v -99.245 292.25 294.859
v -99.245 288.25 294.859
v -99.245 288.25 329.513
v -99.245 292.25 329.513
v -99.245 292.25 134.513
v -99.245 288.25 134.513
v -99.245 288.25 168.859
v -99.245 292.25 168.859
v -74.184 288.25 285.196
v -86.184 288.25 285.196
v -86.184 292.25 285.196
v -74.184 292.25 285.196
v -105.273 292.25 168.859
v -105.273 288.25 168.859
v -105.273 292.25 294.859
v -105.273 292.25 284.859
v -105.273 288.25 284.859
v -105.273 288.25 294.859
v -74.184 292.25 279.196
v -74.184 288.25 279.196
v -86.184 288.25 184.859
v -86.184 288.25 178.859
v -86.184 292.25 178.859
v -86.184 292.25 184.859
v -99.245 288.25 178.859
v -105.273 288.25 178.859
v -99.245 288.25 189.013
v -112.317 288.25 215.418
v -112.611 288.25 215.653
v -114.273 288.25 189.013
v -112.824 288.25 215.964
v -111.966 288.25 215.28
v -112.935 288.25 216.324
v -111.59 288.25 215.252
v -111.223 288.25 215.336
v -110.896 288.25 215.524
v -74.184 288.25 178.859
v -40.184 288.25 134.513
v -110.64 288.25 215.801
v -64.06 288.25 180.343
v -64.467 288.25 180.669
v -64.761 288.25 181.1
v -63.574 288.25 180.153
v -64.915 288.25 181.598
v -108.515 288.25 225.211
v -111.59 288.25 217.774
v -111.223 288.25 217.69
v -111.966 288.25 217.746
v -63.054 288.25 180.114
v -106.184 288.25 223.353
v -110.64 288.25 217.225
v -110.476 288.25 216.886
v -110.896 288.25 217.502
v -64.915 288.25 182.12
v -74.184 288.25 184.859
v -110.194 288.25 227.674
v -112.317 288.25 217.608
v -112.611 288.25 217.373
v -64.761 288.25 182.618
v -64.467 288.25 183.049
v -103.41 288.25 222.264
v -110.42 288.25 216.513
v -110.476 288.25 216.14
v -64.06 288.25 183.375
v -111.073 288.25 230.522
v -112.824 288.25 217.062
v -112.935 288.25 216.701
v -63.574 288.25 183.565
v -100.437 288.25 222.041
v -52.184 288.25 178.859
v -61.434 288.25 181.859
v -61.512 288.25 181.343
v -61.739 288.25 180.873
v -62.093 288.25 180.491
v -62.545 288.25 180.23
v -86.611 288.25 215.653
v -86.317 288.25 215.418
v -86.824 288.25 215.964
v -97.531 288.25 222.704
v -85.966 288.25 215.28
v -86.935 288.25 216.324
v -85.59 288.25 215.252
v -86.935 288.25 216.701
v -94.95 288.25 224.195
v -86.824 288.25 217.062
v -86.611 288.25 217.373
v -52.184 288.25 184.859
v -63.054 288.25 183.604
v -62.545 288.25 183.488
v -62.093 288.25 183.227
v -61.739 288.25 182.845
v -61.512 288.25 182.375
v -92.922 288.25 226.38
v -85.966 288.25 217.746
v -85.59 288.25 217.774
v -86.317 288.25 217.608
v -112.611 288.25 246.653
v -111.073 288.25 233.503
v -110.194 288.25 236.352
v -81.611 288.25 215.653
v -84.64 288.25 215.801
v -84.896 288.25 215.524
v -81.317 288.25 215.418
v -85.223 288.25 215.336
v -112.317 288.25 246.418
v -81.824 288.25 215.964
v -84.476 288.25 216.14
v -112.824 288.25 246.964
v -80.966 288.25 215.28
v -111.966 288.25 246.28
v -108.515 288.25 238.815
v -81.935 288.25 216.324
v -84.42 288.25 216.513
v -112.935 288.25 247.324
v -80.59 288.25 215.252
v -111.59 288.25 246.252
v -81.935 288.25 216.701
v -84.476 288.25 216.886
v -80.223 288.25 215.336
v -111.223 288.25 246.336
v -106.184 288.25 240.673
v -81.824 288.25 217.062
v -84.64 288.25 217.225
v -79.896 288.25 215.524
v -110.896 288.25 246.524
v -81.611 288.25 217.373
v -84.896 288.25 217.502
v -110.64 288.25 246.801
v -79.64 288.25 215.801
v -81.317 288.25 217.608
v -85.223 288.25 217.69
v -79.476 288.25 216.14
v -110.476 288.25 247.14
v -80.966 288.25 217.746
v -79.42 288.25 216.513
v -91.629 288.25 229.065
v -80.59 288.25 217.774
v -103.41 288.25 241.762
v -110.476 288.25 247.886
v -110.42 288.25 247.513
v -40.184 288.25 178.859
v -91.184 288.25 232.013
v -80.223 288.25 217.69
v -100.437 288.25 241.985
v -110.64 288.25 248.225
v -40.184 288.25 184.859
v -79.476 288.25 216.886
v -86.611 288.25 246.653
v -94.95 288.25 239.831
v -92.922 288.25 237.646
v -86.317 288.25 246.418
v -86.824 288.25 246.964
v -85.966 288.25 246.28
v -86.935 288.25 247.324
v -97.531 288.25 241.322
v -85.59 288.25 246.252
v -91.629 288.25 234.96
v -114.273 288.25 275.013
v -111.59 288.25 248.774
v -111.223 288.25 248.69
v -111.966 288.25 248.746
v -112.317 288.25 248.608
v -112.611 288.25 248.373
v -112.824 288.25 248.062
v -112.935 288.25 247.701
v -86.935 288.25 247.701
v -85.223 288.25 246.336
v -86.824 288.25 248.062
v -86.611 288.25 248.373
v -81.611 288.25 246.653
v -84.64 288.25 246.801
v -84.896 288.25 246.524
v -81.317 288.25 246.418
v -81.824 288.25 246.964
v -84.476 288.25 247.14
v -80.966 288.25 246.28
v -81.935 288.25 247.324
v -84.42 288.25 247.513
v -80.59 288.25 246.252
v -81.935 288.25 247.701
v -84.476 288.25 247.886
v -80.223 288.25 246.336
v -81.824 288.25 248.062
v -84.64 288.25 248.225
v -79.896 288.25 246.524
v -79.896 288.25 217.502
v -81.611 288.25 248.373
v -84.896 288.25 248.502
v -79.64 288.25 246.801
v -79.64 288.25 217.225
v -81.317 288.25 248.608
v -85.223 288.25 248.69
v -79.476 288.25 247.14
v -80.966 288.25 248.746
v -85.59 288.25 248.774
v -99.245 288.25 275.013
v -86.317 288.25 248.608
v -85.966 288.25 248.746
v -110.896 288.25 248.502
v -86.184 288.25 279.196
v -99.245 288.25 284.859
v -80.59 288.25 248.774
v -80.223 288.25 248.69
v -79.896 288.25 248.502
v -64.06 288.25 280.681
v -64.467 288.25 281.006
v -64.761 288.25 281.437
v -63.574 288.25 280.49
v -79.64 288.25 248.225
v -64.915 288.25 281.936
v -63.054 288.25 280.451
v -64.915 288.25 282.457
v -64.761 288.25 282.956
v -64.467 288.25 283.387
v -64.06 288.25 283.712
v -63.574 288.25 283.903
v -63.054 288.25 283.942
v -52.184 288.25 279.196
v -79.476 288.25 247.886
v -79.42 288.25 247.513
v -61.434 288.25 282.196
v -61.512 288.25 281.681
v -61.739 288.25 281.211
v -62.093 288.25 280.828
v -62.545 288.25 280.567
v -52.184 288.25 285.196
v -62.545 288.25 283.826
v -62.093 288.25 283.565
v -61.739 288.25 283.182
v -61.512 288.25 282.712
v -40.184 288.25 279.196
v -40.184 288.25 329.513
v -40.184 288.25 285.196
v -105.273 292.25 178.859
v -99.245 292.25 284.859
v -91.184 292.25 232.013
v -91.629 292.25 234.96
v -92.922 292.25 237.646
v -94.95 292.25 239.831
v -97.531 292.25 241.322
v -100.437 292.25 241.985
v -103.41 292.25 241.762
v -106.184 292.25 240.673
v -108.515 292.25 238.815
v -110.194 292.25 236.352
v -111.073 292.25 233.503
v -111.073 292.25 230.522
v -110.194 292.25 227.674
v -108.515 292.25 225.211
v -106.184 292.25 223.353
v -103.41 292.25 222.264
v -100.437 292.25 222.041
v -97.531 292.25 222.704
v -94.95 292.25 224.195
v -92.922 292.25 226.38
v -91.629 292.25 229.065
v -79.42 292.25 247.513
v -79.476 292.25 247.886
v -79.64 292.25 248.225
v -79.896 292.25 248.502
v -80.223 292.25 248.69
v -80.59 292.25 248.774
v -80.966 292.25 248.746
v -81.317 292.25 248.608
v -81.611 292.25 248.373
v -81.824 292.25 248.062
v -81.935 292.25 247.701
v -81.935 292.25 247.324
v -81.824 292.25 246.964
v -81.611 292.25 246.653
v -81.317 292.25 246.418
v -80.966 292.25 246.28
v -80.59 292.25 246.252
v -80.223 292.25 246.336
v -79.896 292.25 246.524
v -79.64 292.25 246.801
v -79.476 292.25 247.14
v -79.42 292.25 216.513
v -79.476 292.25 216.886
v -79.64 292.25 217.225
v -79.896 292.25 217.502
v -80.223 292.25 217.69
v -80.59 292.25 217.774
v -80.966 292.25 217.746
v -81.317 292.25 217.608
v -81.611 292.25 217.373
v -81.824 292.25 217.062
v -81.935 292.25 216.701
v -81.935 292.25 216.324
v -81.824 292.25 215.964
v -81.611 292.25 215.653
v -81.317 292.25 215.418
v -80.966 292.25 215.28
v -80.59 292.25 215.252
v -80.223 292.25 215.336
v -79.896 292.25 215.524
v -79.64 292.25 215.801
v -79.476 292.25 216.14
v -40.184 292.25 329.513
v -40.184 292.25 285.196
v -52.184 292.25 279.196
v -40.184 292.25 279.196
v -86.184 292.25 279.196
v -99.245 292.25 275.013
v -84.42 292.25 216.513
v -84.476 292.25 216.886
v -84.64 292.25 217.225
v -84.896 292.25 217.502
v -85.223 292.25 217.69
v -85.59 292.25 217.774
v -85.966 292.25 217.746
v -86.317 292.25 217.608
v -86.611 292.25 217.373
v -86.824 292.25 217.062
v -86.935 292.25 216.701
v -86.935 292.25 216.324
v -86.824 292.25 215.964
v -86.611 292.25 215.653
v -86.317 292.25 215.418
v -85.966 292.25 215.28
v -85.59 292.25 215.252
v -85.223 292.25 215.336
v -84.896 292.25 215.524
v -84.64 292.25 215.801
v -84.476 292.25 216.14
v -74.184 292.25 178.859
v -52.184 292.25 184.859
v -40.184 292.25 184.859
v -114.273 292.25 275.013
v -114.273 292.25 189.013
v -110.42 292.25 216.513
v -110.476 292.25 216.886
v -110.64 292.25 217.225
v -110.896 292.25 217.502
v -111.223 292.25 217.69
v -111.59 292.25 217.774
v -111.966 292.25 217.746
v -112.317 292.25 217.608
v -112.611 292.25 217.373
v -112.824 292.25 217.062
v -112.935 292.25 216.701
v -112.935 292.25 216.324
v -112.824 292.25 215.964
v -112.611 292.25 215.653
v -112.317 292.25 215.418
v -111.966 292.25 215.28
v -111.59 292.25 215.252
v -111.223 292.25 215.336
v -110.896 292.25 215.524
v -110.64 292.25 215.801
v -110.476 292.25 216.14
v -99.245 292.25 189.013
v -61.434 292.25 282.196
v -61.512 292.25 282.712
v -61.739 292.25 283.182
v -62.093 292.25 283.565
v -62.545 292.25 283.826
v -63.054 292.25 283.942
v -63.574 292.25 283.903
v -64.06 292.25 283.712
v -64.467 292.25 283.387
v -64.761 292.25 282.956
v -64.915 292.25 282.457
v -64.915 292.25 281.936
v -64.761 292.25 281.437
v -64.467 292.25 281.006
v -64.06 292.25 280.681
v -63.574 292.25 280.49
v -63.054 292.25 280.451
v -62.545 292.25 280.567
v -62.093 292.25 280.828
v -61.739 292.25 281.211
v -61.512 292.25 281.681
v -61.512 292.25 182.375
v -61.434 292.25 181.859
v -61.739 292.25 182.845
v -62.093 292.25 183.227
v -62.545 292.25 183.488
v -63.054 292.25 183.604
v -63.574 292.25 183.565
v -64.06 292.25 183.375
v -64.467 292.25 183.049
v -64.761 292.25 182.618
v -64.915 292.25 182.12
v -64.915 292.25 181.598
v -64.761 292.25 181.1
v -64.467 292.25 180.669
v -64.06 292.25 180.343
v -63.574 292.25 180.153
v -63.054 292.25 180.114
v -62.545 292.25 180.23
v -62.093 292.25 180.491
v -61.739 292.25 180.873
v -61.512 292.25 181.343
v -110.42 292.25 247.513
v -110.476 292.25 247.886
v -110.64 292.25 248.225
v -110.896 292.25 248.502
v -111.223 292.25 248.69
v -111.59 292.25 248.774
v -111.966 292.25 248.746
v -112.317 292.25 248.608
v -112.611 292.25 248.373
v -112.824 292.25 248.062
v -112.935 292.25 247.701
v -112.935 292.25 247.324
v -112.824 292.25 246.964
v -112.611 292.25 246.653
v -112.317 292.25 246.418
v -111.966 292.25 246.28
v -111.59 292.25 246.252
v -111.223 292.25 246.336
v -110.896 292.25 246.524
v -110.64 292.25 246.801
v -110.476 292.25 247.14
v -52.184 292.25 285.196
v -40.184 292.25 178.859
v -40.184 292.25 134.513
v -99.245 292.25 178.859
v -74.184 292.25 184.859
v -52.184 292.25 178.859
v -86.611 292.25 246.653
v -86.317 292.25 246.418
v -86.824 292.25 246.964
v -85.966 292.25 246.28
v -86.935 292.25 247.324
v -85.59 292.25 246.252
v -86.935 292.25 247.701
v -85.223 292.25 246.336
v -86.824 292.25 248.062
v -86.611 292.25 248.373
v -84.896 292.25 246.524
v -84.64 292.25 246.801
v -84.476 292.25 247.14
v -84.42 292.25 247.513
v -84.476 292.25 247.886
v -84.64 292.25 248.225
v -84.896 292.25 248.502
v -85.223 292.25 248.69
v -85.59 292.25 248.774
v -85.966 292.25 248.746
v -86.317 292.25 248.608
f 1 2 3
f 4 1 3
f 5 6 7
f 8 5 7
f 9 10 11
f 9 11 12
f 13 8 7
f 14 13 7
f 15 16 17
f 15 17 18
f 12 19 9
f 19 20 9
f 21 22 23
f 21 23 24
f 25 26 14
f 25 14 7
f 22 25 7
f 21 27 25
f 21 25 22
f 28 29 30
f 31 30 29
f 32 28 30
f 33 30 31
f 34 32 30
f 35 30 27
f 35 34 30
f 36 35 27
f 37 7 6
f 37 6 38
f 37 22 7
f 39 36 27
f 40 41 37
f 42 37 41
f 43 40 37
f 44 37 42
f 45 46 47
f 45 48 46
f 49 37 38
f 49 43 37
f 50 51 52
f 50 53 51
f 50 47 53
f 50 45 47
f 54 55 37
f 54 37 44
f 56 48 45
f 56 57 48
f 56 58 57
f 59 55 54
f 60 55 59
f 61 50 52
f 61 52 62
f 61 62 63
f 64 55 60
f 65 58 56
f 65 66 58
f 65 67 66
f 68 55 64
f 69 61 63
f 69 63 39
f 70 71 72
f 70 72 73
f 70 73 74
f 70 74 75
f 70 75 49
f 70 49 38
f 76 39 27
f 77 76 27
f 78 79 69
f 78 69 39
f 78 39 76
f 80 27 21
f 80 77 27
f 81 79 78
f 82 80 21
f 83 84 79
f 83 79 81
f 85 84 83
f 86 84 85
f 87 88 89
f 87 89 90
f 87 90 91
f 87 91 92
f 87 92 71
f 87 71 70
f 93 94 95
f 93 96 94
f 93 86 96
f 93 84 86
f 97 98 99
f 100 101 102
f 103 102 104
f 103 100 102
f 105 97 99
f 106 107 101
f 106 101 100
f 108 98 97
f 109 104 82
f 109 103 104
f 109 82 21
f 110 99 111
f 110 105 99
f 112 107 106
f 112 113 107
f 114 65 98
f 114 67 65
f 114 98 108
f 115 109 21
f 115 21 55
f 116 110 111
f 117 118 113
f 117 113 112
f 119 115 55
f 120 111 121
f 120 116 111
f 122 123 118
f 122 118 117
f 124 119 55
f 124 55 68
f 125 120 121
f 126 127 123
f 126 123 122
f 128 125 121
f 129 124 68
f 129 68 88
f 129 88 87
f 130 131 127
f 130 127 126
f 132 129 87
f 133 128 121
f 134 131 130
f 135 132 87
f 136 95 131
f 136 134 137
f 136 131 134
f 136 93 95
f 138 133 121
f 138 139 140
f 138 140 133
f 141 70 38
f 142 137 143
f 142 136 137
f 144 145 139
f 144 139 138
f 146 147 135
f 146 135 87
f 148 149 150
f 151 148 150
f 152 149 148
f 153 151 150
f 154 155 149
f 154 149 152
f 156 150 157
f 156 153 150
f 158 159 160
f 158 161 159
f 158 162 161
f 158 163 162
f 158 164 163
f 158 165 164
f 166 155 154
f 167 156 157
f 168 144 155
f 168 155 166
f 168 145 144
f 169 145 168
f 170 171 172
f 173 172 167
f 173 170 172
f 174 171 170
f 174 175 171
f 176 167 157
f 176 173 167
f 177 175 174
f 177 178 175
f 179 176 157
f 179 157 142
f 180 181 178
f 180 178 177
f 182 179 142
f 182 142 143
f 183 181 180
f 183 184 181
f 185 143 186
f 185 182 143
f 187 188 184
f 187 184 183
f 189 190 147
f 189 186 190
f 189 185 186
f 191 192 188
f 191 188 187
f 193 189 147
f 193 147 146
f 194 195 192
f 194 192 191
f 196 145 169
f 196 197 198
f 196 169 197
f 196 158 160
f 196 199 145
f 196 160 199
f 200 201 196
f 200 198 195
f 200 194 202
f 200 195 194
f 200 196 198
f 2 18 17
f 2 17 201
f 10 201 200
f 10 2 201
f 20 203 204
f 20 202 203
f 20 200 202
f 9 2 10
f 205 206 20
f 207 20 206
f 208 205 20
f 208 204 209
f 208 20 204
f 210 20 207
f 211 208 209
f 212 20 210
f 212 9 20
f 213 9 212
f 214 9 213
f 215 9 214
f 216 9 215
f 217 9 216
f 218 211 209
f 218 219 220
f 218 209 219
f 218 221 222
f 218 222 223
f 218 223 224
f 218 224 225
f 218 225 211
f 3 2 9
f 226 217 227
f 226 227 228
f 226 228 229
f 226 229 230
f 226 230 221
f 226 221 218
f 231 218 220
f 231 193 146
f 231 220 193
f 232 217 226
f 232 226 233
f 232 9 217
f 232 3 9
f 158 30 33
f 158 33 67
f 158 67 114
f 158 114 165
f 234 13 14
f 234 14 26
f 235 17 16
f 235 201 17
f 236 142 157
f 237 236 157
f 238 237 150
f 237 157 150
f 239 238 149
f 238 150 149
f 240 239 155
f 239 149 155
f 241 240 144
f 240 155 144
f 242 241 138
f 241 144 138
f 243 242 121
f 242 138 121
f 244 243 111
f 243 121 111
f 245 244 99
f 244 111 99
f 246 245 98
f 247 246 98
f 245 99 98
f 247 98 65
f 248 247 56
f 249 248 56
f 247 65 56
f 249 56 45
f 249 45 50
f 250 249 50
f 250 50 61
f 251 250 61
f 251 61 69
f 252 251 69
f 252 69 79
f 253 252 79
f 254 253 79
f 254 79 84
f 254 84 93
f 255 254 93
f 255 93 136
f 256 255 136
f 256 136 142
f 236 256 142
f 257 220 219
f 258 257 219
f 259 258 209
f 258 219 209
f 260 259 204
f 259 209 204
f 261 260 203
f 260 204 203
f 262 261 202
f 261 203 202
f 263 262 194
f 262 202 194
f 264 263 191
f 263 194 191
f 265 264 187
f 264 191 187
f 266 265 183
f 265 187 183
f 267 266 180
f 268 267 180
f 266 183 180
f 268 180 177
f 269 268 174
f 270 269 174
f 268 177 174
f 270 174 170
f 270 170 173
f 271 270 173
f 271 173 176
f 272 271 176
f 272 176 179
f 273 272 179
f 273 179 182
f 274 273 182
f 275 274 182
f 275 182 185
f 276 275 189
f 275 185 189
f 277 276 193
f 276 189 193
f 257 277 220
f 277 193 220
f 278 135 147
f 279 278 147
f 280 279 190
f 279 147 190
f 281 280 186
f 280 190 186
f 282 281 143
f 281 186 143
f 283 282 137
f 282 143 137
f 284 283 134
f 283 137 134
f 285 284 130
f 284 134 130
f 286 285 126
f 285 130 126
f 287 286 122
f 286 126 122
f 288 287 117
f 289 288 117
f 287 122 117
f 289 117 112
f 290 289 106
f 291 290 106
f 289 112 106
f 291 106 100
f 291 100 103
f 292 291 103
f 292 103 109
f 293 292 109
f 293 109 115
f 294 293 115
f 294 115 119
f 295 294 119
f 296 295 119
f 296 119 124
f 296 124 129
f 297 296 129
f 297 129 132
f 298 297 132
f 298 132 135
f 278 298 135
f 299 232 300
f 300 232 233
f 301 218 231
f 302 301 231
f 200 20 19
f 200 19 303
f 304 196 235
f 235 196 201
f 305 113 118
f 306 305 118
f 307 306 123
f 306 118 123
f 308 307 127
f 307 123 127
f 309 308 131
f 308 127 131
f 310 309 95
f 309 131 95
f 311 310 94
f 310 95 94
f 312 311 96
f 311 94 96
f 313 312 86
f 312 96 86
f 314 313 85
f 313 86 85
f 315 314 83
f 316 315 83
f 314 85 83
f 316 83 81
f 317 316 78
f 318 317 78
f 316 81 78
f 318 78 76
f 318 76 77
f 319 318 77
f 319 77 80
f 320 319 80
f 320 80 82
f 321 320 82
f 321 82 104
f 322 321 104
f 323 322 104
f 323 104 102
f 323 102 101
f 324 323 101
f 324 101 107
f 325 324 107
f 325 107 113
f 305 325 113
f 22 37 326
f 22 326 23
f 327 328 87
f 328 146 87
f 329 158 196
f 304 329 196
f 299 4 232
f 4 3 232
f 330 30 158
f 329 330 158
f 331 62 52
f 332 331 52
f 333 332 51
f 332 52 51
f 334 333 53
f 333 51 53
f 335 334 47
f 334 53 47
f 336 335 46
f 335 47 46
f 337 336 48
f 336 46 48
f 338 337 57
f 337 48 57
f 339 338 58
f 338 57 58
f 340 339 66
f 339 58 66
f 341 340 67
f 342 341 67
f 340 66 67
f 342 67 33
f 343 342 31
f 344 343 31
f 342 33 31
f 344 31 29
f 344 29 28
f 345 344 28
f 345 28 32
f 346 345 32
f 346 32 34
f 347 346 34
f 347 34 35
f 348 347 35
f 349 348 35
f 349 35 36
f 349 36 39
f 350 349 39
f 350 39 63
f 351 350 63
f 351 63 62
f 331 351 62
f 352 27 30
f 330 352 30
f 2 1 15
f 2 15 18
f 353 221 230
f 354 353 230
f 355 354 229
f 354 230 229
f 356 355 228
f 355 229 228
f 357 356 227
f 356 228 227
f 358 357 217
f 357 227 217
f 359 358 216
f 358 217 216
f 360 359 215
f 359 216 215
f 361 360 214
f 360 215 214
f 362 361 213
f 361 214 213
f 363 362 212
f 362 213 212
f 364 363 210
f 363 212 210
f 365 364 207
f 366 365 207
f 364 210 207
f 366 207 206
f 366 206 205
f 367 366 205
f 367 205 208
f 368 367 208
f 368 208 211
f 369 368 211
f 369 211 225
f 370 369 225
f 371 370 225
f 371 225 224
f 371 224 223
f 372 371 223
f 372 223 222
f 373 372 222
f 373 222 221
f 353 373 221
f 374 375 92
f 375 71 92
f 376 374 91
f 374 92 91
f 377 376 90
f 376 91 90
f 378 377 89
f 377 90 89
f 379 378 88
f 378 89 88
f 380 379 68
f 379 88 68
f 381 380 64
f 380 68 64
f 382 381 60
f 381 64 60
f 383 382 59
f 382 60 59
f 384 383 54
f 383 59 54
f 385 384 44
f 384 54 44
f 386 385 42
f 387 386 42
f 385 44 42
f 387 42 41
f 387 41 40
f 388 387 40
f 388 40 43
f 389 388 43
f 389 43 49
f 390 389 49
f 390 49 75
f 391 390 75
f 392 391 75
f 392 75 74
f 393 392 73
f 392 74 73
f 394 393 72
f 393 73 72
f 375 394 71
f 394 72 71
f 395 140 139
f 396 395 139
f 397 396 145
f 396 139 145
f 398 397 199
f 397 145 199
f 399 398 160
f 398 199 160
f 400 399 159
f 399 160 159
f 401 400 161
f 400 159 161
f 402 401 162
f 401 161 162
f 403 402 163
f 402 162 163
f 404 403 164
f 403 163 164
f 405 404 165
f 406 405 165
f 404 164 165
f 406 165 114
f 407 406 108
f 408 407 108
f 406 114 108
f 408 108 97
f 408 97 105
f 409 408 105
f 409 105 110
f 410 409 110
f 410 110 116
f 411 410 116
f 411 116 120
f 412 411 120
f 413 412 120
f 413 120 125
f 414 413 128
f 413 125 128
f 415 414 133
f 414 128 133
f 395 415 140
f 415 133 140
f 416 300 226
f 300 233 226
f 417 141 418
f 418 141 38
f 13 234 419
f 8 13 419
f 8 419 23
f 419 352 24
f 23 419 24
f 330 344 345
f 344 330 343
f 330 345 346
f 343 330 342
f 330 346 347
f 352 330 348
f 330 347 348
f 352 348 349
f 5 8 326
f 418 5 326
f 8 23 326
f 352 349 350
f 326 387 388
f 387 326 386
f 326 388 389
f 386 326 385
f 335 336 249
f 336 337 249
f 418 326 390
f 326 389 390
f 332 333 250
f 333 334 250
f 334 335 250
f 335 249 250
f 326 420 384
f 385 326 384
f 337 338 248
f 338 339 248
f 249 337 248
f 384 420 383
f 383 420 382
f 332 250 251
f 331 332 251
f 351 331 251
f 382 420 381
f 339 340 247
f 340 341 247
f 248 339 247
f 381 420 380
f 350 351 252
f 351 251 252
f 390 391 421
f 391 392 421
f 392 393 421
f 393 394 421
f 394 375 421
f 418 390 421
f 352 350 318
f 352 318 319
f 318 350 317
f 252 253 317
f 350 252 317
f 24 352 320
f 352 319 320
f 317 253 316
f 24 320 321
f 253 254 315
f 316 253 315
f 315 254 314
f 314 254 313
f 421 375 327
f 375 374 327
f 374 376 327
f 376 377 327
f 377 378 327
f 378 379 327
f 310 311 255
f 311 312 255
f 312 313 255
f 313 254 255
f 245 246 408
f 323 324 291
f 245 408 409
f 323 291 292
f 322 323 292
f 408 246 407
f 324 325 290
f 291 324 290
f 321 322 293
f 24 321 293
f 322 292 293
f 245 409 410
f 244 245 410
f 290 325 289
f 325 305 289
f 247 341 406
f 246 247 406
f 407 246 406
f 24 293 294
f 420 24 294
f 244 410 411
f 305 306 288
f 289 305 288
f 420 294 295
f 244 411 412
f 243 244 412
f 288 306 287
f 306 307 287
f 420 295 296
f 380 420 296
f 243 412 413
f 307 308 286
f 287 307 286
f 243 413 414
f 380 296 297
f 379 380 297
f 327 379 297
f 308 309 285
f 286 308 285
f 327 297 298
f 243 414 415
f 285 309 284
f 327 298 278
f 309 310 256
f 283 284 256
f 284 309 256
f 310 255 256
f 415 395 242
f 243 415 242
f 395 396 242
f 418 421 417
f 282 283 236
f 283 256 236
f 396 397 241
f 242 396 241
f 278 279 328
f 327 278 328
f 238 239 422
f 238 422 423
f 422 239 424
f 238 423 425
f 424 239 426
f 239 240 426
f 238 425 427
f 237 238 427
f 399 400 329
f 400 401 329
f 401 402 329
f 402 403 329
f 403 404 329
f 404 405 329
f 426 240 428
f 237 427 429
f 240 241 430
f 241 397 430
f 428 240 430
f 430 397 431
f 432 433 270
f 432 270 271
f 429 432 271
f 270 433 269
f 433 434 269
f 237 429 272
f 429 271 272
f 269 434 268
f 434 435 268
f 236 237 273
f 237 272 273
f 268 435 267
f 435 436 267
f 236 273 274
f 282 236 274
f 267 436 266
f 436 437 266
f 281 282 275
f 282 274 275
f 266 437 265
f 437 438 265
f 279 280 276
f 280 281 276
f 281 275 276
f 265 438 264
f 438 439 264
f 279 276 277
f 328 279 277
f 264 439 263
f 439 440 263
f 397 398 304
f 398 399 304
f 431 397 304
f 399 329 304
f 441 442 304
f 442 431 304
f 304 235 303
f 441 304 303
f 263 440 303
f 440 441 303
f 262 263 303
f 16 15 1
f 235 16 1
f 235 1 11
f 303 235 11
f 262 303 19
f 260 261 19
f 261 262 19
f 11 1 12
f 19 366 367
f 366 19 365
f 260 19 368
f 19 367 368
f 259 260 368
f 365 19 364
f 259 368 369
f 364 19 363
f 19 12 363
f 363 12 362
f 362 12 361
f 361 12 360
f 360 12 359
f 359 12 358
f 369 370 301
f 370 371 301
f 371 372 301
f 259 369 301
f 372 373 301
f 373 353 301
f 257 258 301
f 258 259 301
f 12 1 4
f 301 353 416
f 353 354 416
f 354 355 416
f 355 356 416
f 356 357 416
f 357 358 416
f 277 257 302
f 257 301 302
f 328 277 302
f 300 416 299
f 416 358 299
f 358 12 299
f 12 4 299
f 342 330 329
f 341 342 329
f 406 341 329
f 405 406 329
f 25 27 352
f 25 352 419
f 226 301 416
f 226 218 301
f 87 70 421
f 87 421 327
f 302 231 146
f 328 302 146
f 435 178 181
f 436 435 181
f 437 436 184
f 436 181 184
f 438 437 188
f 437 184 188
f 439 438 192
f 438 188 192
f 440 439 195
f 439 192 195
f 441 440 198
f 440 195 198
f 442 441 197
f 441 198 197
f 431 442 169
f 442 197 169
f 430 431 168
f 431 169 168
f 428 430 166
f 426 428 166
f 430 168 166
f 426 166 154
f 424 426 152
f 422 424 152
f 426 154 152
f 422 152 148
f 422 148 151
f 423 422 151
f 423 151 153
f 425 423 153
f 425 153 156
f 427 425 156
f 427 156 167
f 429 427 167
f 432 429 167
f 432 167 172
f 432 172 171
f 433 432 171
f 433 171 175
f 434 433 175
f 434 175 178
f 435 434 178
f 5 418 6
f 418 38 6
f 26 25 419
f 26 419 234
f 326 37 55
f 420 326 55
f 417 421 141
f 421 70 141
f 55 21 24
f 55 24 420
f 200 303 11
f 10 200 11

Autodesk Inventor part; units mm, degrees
ref_plane "YZ Plane" through (0, 0, 0) normal (1, 0, 0) x (0, 1, 0)
ref_plane "XZ Plane" through (0, 0, 0) normal (0, 1, 0) x (-1, 0, 0)
ref_plane "РабПлоскость1" through (-53.4845, 288.2505, 354.5129) normal (0, 1, 0) x (-1, 0, 0)
sketch "Эскиз1" plane through (-53.4845, 288.2505, 354.5129) normal (0, 1, 0) x (-1, 0, 0)
  line L0 (45.7889, -56.5016) -> (45.7889, -62.7516) projected
  line L1 (-13.3, 2.5) -> (-13.3, -247.5) projected
  line L2 (-13.3, -220) -> (32.7, -220)
  line L3 (32.7, -220) -> (32.7, -25)
  line L4 (32.7, -25) -> (-13.3, -25)
  line L5 (-13.3, -25) -> (-13.3, -220)
  line L6 (-5.3, -220) -> (142.8907, -220) projected
  line L7 (201.7, -25) -> (166.8907, -25) projected
  point P0 (-53.4845, -354.5129)
  point P1 (-13.3, -25)
  point P2 (-13.3, -220)
  point P3 (32.7, -62.75)
  point P4 (32.7, -56.5)
extrude "Выдавливание1" add sketch "Эскиз1" along normal blind 4
sketch "Эскиз6" plane through (-53.4845, 288.2505, 354.5129) normal (0, -1, 0) x (1, 0, 0)
  line L0 (-32.7, -169.6539) -> (-20.7, -169.6539) projected
  line L1 (-32.7, -175.6539) -> (-32.7, -169.6539) projected
  line L2 (-20.7, -175.6539) -> (-32.7, -175.6539) projected
  line L3 (-20.7, -175.6539) -> (-20.7, -169.6539) projected
  line L4 (-32.7, -69.3164) -> (-20.7, -69.3164) projected
  line L5 (-32.7, -75.3164) -> (-32.7, -69.3164) projected
  line L6 (-20.7, -75.3164) -> (-32.7, -75.3164) projected
  line L7 (-20.7, -75.3164) -> (-20.7, -69.3164) projected
  line L8 (13.3, -220) -> (-32.7, -220) projected
  line L9 (-9.7, -220) -> (-9.7, 17.4543)
  line L10 (13.3, -169.6539) -> (1.3, -169.6539)
  line L11 (13.3, -175.6539) -> (13.3, -169.6539)
  line L12 (1.3, -175.6539) -> (13.3, -175.6539)
  line L13 (1.3, -175.6539) -> (1.3, -169.6539)
  line L14 (13.3, -69.3164) -> (1.3, -69.3164)
  line L15 (13.3, -75.3164) -> (13.3, -69.3164)
  line L16 (1.3, -75.3164) -> (13.3, -75.3164)
  line L17 (1.3, -75.3164) -> (1.3, -69.3164)
  point P0 (53.4845, -354.5129)
extrude "Выдавливание3" cut sketch "Эскиз6" against normal blind 8
sketch "Эскиз7" plane through (-53.4845, 288.2505, 354.5129) normal (0, -1, 0) x (1, 0, 0)
  line L0 (-12.95, -175.6539) -> (-12.95, -169.6539) projected
  line L1 (-7.95, -169.6539) -> (-7.95, -175.6539) projected
  line L2 (-6.45, -175.6539) -> (-6.45, -169.6539) projected
  line L3 (-11.45, -175.6539) -> (-11.45, -169.6539) projected
  line L4 (-12.95, -175.6539) -> (-12.95, -169.6539) projected
  line L5 (-11.45, -175.6539) -> (-7.95, -175.6539)
  line L6 (-7.95, -175.6539) -> (-7.95, -169.6539)
  line L7 (-7.95, -169.6539) -> (-11.45, -169.6539)
  line L8 (-11.45, -169.6539) -> (-11.45, -175.6539)
  circle A0 centre (-9.7, -172.6539) radius 1.75
  line L9 (-32.7, -122.4852) -> (36.9657, -122.4852)
  line L10 (-12.95, -69.3164) -> (-12.95, -75.3164)
  line L11 (-7.95, -75.3164) -> (-7.95, -69.3164)
  line L12 (-6.45, -69.3164) -> (-6.45, -75.3164)
  line L13 (-11.45, -69.3164) -> (-11.45, -75.3164)
  line L14 (-12.95, -69.3164) -> (-12.95, -75.3164)
  line L15 (-11.45, -69.3164) -> (-7.95, -69.3164)
  line L16 (-7.95, -69.3164) -> (-7.95, -75.3164)
  line L17 (-7.95, -75.3164) -> (-11.45, -75.3164)
  line L18 (-11.45, -75.3164) -> (-11.45, -69.3164)
  circle A1 centre (-9.7, -72.3164) radius 1.75
  point P0 (53.4845, -354.5129)
extrude "Выдавливание4" cut sketch "Эскиз7" against normal blind 8 contours A0 | A1
sketch "Эскиз8" plane through (-53.4845, 288.2505, 354.5129) normal (0, -1, 0) x (1, 0, 0)
  line L0 (-45.7889, -165.5) -> (-60.7889, -165.5)
  line L1 (-60.7889, -165.5) -> (-60.7889, -79.5)
  line L2 (-60.7889, -79.5) -> (-45.7889, -79.5)
  line L3 (-45.7889, -79.5) -> (-45.7889, -165.5)
  point P0 (53.4845, -354.5129)
  point P1 (-51.7889, -79.5)
  dimension "d15" = 15
extrude "Выдавливание5" add sketch "Эскиз8" against normal blind 4
sketch "Эскиз9" plane through (-53.4845, 288.2505, 354.5129) normal (0, -1, 0) x (1, 0, 0)
  circle A0 centre (-58.2, -138) radius 1.2645 projected
  circle A1 centre (-58.2, -107) radius 1.2645 projected
  circle A2 centre (-27.2, -107) radius 1.2645 projected
  circle A3 centre (-27.2, -138) radius 1.2645 projected
  point P0 (53.4845, -354.5129)
extrude "Выдавливание6" cut sketch "Эскиз9" against normal blind 4
sketch "Эскиз11" plane through (-86.1845, 288.2505, 329.5129) normal (-1, 0, 0) x (0, 0, 1)
  line L0 (-160.6539, 0) -> (-150.6539, 0)
  line L1 (-150.6539, 0) -> (-150.6539, 4)
  line L2 (-150.6539, 4) -> (-160.6539, 4)
  line L3 (-160.6539, 4) -> (-160.6539, 0)
  line L4 (-44.6539, 4) -> (-34.6539, 4)
  line L5 (-34.6539, 4) -> (-34.6539, 0)
  line L6 (-34.6539, 0) -> (-44.6539, 0)
  line L7 (-44.6539, 0) -> (-44.6539, 4)
  point P0 (-329.5129, -288.2505)
ref_plane "РабПлоскость2" through (-105.2734, 252.5455, 159.0129) normal (-1, 0, 0) x (0, 0, 1)
extrude "Выдавливание8" add sketch "Эскиз11" along normal up to surface (19.0889 mm away)
sketch "Эскиз12" plane through (-53.4845, 288.2505, 354.5129) normal (0, -1, 0) x (1, 0, 0)
  line L0 (-60.7889, -79.5) -> (-60.7889, -165.5) projected
  line L1 (-32.7, -220) -> (-32.7, -25) projected
  line L2 (-60.7889, -79.5) -> (-32.7, -79.5)
  line L3 (-32.7, -79.5) -> (-32.7, -165.5)
  line L4 (-32.7, -165.5) -> (-60.7889, -165.5)
  line L5 (-60.7889, -165.5) -> (-60.7889, -79.5)
  point P0 (53.4845, -354.5129)
  point P1 (-32.7, -169.6539)
  point P2 (-32.7, -75.3164)
  point P3 (-32.7, -185.6539)
  dimension "d24" = 86
extrude "Выдавливание9" add sketch "Эскиз12" against normal blind 4
sketch "Эскиз13" plane through (-53.4845, 288.2505, 354.5129) normal (0, -1, 0) x (1, 0, 0)
  circle A0 centre (-58.2, -107) radius 1.2645 projected
  circle A1 centre (-58.2, -138) radius 1.2645 projected
  circle A2 centre (-42.7, -122.5) radius 3.3 projected
  point P0 (53.4845, -354.5129)
extrude "Выдавливание10" cut sketch "Эскиз13" against normal blind 8
sketch "Эскиз14" plane through (-53.4845, 288.2505, 354.5129) normal (0, -1, 0) x (1, 0, 0)
  line L0 (-45.7603, -165.5) -> (-45.7603, -175.6539)
  line L1 (-45.7603, -175.6539) -> (-32.7, -175.6539)
  line L2 (-45.7603, -185.6539) -> (-32.7, -185.6539)
  line L3 (-32.7, -185.6539) -> (-32.7, -220)
  line L4 (-32.7, -220) -> (-45.7603, -220)
  line L5 (-45.7603, -220) -> (-45.7603, -185.6539)
  line L6 (-45.7603, -79.5) -> (-45.7603, -69.6539)
  line L7 (-45.7603, -59.6539) -> (-45.7603, -25)
  line L8 (-45.7603, -25) -> (-32.7, -25)
  line L9 (-32.7, -79.5) -> (-45.7603, -79.5)
  line L10 (-45.7603, -79.5) -> (-45.7603, -69.6539)
  line L11 (-45.7603, -25) -> (-32.7, -25)
  line L12 (-32.7, -25) -> (-32.7, -59.6539)
  line L13 (-32.7, -59.6539) -> (-45.7603, -59.6539)
  line L14 (-45.7603, -59.6539) -> (-45.7603, -25)
  line L15 (-45.7603, -79.5) -> (-32.7, -79.5)
  line L16 (-32.7, -79.5) -> (-32.7, -69.6539)
  line L17 (-32.7, -69.6539) -> (-45.7603, -69.6539)
  line L18 (-45.7603, -69.6539) -> (-45.7603, -79.5)
  line L19 (-45.7603, -175.6539) -> (-32.7, -175.6539)
  line L20 (-32.7, -175.6539) -> (-32.7, -165.5)
  line L21 (-32.7, -165.5) -> (-45.7603, -165.5)
  line L22 (-45.7603, -165.5) -> (-45.7603, -175.6539)
  point P0 (53.4845, -354.5129)
  point P1 (13.3, -220)
  point P2 (-32.7, -25)
  point P3 (-45.7603, -69.6539)
  point P4 (-45.7603, -165.5)
extrude "Выдавливание11" add sketch "Эскиз14" against normal blind 4
sketch "Эскиз16" plane through (-53.4845, 288.2505, 354.5129) normal (0, -1, 0) x (1, 0, 0)
  circle A0 centre (-42.7, -122.5) radius 4.1 projected
  circle A1 centre (-47.7, -122.5) radius 10
  circle A2 centre (-58.2, -107) radius 1.2645 projected
  circle A3 centre (-27.2, -107) radius 1.2645 projected
  circle A4 centre (-27.2, -138) radius 1.2645 projected
  circle A5 centre (-58.2, -138) radius 1.2645 projected
  circle A6 centre (-63.2, -107) radius 1.2645
  circle A7 centre (-32.2, -107) radius 1.2645
  circle A8 centre (-63.2, -138) radius 1.2645
  circle A9 centre (-32.2, -138) radius 1.2645
  point P0 (53.4845, -354.5129)
  dimension "d35" = 5
  dimension "d36" = 0
  dimension "d37" = 20
  dimension "d38" = 5
  dimension "d39" = 5
  dimension "d40" = 5
  dimension "d41" = 5
extrude "Выдавливание13" cut sketch "Эскиз16" against normal blind 10 contours A0 | A1 | A6 | A7 | A8 | A9
properties part number "крепление Y"
